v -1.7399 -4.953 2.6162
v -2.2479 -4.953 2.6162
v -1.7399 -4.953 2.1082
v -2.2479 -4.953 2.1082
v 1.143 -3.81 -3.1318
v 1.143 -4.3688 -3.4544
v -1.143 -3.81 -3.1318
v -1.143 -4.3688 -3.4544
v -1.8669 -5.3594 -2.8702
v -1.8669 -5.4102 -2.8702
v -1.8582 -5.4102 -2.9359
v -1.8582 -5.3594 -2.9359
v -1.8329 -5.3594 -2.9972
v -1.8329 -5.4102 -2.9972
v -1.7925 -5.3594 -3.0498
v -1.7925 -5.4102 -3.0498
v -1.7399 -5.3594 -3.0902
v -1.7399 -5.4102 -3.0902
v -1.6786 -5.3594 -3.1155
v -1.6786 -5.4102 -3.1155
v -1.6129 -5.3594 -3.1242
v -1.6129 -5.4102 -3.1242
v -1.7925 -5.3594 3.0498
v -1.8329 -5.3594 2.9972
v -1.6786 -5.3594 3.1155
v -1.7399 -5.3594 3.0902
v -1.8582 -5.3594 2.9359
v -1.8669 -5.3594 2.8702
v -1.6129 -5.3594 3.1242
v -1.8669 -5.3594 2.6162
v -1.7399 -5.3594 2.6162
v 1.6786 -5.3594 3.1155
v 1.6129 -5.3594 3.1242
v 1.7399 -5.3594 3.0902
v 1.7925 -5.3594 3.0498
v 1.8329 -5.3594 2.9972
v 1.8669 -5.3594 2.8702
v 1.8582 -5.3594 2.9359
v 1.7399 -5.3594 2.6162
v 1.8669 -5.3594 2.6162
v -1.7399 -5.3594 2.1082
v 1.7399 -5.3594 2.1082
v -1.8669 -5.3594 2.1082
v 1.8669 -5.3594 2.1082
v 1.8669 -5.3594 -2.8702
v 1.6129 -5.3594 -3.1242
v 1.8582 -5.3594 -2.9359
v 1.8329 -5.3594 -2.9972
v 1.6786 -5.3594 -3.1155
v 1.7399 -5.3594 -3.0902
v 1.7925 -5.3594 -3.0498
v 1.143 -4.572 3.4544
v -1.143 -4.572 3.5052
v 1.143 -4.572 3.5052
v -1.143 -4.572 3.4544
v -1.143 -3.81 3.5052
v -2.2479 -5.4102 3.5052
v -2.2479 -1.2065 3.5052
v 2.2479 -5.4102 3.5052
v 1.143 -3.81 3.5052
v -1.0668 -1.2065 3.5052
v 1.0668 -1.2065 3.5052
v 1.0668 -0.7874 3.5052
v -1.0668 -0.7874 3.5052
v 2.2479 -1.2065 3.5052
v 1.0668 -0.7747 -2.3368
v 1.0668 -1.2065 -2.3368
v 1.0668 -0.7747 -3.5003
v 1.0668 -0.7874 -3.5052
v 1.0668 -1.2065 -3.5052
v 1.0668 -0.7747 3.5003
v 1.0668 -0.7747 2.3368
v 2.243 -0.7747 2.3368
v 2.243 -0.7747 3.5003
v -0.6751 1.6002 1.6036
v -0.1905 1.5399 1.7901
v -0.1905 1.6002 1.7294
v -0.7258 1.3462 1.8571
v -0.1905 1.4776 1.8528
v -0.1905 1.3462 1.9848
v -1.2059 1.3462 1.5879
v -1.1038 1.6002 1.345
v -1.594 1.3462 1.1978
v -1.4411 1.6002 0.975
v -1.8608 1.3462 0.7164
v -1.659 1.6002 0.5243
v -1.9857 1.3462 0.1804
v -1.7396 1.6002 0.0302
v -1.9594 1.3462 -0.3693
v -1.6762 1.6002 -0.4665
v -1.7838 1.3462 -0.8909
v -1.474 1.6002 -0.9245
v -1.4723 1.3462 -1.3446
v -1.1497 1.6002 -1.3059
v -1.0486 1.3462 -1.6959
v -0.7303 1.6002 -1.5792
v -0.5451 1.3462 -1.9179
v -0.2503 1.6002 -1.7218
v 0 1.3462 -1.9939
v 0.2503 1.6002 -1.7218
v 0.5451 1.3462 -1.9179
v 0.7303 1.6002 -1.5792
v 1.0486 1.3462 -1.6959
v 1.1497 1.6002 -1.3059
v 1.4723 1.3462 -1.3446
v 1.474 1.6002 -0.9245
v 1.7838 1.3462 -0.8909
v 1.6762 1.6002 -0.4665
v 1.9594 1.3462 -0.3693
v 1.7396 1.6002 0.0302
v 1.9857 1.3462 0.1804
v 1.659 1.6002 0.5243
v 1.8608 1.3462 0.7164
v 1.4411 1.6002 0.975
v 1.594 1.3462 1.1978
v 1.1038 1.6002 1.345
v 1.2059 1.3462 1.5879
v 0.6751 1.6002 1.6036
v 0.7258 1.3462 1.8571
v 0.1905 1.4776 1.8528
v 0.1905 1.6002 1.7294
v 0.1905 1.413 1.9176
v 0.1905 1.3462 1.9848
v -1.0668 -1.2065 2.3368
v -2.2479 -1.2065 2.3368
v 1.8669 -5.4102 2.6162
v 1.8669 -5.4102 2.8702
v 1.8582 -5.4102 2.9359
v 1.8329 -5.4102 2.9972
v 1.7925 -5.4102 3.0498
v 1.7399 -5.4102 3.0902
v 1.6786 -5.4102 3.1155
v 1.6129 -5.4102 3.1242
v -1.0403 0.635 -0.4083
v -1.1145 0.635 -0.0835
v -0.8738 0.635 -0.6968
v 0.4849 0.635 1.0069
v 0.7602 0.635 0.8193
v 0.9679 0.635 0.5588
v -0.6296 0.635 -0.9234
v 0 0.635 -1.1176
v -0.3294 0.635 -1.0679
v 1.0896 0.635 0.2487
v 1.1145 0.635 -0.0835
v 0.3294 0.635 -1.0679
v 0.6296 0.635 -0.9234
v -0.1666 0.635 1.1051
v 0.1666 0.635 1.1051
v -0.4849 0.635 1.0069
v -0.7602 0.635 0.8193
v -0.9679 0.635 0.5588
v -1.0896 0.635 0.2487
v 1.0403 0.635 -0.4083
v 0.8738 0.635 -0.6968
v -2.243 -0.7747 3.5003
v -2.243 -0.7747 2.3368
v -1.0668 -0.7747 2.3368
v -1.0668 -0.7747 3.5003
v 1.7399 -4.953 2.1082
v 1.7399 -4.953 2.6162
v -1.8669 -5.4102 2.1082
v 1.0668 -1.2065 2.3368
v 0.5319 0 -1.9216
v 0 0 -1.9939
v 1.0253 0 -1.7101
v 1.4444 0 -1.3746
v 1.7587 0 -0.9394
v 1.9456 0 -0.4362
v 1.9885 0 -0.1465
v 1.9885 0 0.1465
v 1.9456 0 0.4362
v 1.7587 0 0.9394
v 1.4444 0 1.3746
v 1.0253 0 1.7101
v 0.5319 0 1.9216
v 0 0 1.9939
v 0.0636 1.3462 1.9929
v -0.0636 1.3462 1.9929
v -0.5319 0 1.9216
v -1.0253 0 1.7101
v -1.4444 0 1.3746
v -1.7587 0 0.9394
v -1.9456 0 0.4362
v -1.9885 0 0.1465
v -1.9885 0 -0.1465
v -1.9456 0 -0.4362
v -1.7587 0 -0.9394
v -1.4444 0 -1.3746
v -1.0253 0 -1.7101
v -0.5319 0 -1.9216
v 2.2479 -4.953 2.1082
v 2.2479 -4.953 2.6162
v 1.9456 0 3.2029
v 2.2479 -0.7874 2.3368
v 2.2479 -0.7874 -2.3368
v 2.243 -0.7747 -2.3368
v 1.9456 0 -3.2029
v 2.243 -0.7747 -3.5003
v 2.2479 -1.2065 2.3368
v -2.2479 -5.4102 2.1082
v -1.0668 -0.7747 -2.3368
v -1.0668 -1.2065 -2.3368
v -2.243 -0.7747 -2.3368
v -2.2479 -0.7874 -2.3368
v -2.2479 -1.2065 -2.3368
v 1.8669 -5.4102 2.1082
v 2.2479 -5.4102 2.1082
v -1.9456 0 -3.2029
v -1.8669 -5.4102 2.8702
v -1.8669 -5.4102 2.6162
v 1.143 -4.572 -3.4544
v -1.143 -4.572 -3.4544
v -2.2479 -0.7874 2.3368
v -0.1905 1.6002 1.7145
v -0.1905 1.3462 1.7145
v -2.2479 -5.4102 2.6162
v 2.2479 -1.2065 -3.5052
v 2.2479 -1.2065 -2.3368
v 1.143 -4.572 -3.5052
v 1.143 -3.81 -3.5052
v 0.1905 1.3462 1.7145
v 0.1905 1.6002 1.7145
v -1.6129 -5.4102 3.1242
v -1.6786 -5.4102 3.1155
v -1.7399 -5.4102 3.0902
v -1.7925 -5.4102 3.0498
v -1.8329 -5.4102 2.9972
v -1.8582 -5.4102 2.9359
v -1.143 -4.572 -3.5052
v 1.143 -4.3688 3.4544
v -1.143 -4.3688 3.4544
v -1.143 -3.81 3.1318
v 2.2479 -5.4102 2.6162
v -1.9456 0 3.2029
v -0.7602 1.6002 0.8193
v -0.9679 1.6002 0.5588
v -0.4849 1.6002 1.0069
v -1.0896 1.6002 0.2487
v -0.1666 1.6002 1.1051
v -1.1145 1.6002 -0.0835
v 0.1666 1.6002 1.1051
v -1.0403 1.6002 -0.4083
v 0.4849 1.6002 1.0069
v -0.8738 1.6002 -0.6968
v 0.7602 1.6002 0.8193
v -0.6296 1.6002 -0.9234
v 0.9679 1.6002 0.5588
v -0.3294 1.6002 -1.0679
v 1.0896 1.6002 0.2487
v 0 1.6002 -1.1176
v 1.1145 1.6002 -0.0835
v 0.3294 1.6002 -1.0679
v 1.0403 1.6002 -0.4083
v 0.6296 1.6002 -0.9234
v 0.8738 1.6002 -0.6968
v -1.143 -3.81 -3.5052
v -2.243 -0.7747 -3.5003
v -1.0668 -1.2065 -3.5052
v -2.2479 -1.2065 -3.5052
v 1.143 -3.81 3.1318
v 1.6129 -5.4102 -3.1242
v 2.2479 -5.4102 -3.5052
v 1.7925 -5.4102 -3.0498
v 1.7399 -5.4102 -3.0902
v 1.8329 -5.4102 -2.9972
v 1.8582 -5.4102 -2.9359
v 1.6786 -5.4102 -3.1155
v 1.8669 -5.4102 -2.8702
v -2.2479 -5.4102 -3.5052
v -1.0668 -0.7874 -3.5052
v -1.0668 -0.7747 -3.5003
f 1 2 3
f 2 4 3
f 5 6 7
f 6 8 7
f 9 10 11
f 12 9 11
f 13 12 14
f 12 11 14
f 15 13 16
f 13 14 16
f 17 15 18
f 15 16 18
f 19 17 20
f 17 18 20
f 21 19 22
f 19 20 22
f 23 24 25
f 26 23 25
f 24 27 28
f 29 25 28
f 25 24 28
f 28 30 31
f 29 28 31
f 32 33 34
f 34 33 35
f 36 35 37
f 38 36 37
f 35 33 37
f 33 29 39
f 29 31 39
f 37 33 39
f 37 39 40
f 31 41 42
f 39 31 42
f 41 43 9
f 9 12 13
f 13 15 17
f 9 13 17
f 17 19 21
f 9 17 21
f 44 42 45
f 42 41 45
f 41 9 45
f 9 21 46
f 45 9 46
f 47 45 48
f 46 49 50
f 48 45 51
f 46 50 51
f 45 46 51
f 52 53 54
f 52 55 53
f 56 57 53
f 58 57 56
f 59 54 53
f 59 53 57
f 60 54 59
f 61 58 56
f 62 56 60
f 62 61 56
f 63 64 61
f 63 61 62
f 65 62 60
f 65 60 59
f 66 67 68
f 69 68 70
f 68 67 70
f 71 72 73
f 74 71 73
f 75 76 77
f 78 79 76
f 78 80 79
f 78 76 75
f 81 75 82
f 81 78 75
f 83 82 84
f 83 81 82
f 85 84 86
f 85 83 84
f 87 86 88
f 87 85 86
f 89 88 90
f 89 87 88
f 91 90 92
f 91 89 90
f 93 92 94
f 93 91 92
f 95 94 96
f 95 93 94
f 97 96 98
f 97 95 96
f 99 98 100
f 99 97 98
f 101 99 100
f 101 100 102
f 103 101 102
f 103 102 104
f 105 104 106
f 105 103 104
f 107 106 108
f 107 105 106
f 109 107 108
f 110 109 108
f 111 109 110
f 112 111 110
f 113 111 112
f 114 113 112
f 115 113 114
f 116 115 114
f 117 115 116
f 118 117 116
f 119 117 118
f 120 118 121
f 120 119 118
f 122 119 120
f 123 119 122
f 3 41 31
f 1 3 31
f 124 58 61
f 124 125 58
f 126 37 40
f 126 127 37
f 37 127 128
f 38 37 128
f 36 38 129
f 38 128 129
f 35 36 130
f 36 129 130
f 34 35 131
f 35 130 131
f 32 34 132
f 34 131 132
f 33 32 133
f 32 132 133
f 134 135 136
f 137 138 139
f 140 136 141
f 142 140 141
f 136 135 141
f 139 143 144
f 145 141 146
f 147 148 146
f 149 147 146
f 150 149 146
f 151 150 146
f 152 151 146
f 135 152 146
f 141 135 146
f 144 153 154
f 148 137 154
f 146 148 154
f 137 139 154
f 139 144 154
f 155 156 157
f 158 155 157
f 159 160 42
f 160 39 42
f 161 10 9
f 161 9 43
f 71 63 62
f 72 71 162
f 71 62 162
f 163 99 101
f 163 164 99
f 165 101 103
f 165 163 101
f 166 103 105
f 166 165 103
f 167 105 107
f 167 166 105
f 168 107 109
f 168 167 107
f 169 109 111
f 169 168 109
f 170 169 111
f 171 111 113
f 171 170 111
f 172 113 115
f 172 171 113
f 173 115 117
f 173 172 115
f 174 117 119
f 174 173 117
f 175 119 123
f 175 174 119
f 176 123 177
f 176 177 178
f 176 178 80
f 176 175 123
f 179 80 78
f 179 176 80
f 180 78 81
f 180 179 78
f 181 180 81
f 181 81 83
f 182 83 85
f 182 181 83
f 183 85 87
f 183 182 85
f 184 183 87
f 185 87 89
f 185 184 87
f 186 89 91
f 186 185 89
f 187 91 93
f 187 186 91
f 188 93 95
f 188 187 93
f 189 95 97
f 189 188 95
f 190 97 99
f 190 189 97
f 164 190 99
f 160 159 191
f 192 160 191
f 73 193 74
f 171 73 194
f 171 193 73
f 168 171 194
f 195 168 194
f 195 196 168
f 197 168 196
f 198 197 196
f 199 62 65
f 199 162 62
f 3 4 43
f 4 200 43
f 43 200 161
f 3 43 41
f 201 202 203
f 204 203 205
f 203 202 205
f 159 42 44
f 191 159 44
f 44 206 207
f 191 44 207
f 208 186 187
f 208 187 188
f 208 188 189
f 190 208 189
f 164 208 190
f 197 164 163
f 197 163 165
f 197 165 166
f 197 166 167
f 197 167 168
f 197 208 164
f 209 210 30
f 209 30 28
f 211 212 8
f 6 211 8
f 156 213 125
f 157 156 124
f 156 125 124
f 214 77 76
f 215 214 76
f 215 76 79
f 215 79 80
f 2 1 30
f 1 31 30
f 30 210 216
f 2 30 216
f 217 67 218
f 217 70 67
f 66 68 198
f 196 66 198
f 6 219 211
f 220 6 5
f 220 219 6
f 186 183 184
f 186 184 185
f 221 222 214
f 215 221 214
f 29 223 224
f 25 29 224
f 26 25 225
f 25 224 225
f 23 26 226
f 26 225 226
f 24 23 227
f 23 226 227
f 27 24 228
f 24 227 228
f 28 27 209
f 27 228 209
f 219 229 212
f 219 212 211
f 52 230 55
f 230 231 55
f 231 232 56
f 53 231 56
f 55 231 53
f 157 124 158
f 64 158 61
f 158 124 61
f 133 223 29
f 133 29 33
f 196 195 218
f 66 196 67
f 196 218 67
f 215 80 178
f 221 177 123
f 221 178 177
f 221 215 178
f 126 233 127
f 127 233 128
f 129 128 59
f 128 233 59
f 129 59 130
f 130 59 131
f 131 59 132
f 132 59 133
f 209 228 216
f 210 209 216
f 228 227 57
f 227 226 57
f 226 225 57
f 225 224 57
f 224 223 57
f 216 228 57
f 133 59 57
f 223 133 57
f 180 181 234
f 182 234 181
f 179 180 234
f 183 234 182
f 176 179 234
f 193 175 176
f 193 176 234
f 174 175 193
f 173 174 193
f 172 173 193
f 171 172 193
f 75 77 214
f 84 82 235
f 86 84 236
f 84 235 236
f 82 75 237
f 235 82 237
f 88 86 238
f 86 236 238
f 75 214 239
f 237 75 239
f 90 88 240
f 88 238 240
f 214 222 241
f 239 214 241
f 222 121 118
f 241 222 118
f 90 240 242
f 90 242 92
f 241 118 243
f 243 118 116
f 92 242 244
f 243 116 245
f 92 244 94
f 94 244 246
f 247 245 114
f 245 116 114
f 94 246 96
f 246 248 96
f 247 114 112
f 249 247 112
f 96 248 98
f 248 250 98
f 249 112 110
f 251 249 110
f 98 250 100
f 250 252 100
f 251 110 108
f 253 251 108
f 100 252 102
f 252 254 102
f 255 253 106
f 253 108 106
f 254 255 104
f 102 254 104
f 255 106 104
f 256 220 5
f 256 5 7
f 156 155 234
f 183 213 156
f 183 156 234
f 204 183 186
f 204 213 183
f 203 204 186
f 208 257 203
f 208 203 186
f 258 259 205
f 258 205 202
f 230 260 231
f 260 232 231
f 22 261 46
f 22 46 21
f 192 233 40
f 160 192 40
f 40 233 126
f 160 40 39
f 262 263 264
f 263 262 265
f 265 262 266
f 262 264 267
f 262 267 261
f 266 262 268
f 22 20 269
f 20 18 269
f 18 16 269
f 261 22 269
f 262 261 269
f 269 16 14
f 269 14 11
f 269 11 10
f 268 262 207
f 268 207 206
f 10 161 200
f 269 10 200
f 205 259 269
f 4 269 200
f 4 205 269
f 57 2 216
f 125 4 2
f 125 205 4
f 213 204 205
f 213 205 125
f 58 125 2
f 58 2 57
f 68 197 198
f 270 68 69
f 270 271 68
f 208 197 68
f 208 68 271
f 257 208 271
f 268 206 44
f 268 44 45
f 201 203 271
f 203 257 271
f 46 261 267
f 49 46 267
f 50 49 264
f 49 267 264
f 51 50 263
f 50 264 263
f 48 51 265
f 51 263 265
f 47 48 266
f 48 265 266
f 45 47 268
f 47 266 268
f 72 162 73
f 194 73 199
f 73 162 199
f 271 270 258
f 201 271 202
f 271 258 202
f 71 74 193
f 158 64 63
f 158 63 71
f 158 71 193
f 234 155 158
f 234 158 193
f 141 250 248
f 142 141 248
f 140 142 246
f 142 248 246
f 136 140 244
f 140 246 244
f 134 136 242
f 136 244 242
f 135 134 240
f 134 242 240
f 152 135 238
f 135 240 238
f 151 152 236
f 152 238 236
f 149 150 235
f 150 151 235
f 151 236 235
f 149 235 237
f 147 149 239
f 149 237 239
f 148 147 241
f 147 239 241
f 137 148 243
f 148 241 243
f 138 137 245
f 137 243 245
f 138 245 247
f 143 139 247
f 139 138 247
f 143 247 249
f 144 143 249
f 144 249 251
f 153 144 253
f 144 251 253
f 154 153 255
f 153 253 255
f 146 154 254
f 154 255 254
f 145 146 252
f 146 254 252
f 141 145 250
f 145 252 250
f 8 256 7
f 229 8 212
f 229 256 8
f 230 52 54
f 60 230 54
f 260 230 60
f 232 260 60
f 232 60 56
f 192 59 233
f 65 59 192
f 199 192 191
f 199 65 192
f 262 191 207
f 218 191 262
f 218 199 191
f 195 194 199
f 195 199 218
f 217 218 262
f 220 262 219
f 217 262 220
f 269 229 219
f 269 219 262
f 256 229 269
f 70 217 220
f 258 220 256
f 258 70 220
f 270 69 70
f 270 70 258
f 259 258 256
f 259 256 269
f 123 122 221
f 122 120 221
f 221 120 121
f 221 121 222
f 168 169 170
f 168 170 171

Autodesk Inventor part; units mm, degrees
sketch "Sketch_1" plane through (0, 0, 0) normal (0, 1, 0) x (-1, 0, 0)
  line L0 (2.2479, 3.5052) -> (-2.2479, 3.5052)
  line L1 (-2.2479, 3.5052) -> (-2.2479, -3.5052)
  line L2 (-2.2479, -3.5052) -> (2.2479, -3.5052)
  line L3 (2.2479, -3.5052) -> (2.2479, 3.5052)
extrude "Extrusion1" add sketch "Sketch_1" against normal blind 5.4102
sketch "Sketch_2" plane through (0, 0, 0) normal (0, 0, 1) x (1, 0, 0)
  line L0 (-2.2479, -0.7874) -> (-1.9456, 0)
  line L1 (-1.9456, 0) -> (1.9456, 0)
  line L2 (1.9456, 0) -> (2.2479, -0.7874)
  line L3 (2.2479, -0.7874) -> (2.2479, 0.127)
  line L4 (2.2479, 0.127) -> (-2.2479, 0.127)
  line L5 (-2.2479, 0.127) -> (-2.2479, -0.7874)
extrude "Extrusion2" cut sketch "Sketch_2" along normal mid plane 7.0104
sketch "Sketch_3" plane through (0, 0, 0) normal (1, 0, 0) x (0, 1, 0)
  line L0 (-0.7874, 3.5052) -> (0, 3.2029)
  line L1 (0, 3.2029) -> (0, -3.2029)
  line L2 (0, -3.2029) -> (-0.7874, -3.5052)
  line L3 (-0.7874, -3.5052) -> (0.127, -3.5052)
  line L4 (0.127, -3.5052) -> (0.127, 3.5052)
  line L5 (0.127, 3.5052) -> (-0.7874, 3.5052)
extrude "Extrusion3" cut sketch "Sketch_3" along normal mid plane 4.4958
sketch "Sketch_4" plane through (0, -0.9906, 0) normal (0, 1, 0) x (1, 0, 0)
  line L0 (-2.5256, 3.7556) -> (-2.5256, -3.7297)
  line L1 (-2.5256, -3.7297) -> (2.532, -3.7297)
  line L2 (2.532, -3.7297) -> (2.532, 3.7556)
  line L3 (2.532, 3.7556) -> (-2.5256, 3.7556)
  line L4 (-2.2479, 2.3368) -> (-2.2479, -2.3368)
  line L5 (-2.2479, -2.3368) -> (-1.0668, -2.3368)
  line L6 (-1.0668, -2.3368) -> (-1.0668, -3.5052)
  line L7 (-1.0668, -3.5052) -> (1.0668, -3.5052)
  line L8 (1.0668, -3.5052) -> (1.0668, -2.3368)
  line L9 (1.0668, -2.3368) -> (2.2479, -2.3368)
  line L10 (2.2479, -2.3368) -> (2.2479, 2.3368)
  line L11 (2.2479, 2.3368) -> (1.0668, 2.3368)
  line L12 (1.0668, 2.3368) -> (1.0668, 3.5052)
  line L13 (1.0668, 3.5052) -> (-1.0668, 3.5052)
  line L14 (-1.0668, 3.5052) -> (-1.0668, 2.3368)
  line L15 (-1.0668, 2.3368) -> (-2.2479, 2.3368)
extrude "Extrusion4" cut sketch "Sketch_4" along normal mid plane 0.4318
sketch "Sketch_5" plane through (0, 0, 0) normal (1, 0, 0) x (0, 1, 0)
  line L0 (0, 0) -> (1.6002, 0)
  line L1 (0.635, 0) -> (0.635, -1.1176)
  line L2 (0.635, -1.1176) -> (1.6002, -1.1176)
  line L3 (1.6002, -1.1176) -> (1.6002, -1.7399)
  line L4 (1.6002, -1.7399) -> (1.3462, -1.9939)
  line L5 (1.3462, -1.9939) -> (0, -1.9939)
  line L6 (0, -1.9939) -> (0, 0)
  line L7 (0, 0) -> (0.635, 0)
revolve "Revolution1" add sketch "Sketch_5" angle 360 about axis through (0, 0, 0) along (0, -1, 0)
sketch "Sketch_6" plane through (0, -5.4102, 0) normal (0, 1, 0) x (1, 0, 0)
  line L0 (-2.6354, 3.6285) -> (-2.6354, -3.6285)
  line L1 (-2.6354, -3.6285) -> (2.6743, -3.6285)
  line L2 (2.6743, -3.6285) -> (2.6743, 3.6285)
  line L3 (2.6743, 3.6285) -> (-2.6354, 3.6285)
  line L4 (-2.2479, -3.5052) -> (2.2479, -3.5052)
  line L5 (2.2479, -3.5052) -> (2.2479, -2.6162)
  line L6 (2.2479, -2.6162) -> (1.7399, -2.6162)
  line L7 (1.7399, -2.6162) -> (1.7399, -2.1082)
  line L8 (1.7399, -2.1082) -> (2.2479, -2.1082)
  line L9 (2.2479, -2.1082) -> (2.2479, 3.5052)
  line L10 (2.2479, 3.5052) -> (-2.2479, 3.5052)
  line L11 (-2.2479, 3.5052) -> (-2.2479, -2.1082)
  line L12 (-2.2479, -2.1082) -> (-1.7399, -2.1082)
  line L13 (-1.7399, -2.1082) -> (-1.7399, -2.6162)
  line L14 (-1.7399, -2.6162) -> (-2.2479, -2.6162)
  line L15 (-2.2479, -2.6162) -> (-2.2479, -3.5052)
extrude "Extrusion5" cut sketch "Sketch_6" along normal blind 0.4572
sketch "Sketch_7" plane through (0, -5.4102, 0) normal (0, 1, 0) x (1, 0, 0)
  line L0 (-1.8669, 2.8702) -> (-1.8669, -2.8702)
  arc A0 (-1.8669, -2.8702) -> (-1.6129, -3.1242) centre (-1.6129, -2.8702) ccw
  line L1 (-1.6129, -3.1242) -> (1.6129, -3.1242)
  arc A1 (1.6129, -3.1242) -> (1.8669, -2.8702) centre (1.6129, -2.8702) ccw
  line L2 (1.8669, -2.8702) -> (1.8669, 2.8702)
  arc A2 (1.8669, 2.8702) -> (1.6129, 3.1242) centre (1.6129, 2.8702) ccw
  line L3 (1.6129, 3.1242) -> (-1.6129, 3.1242)
  arc A3 (-1.6129, 3.1242) -> (-1.8669, 2.8702) centre (-1.6129, 2.8702) ccw
extrude "Extrusion6" cut sketch "Sketch_7" along normal blind 0.0508
sketch "Sketch_11" plane through (0, 1.6002, 0) normal (0, 1, 0) x (1, 0, 0)
  line L0 (-0.1905, -1.7145) -> (-0.1905, -2.0955)
  line L1 (-0.1905, -2.0955) -> (0.1905, -2.0955)
  line L2 (0.1905, -2.0955) -> (0.1905, -1.7145)
  line L3 (0.1905, -1.7145) -> (-0.1905, -1.7145)
extrude "Extrusion7" cut sketch "Sketch_11" against normal blind 0.254
sketch "Sketch_13" plane through (0, 0, 0) normal (0, 0, 1) x (1, 0, 0)
  line L0 (-1.143, -3.81) -> (-1.143, -4.572)
  line L1 (-1.143, -4.572) -> (1.143, -4.572)
  line L2 (1.143, -4.572) -> (1.143, -3.81)
  line L3 (1.143, -3.81) -> (-1.143, -3.81)
extrude "Extrusion8" cut sketch "Sketch_13" along normal mid plane 15.24
sketch "Sketch_14" plane through (0, 0, 0) normal (1, 0, 0) x (0, 1, 0)
  line L0 (-4.3688, 3.4544) -> (-4.572, 3.4544)
  line L1 (-4.572, 3.4544) -> (-4.572, -3.4544)
  line L2 (-4.572, -3.4544) -> (-4.3688, -3.4544)
  line L3 (-4.3688, -3.4544) -> (-3.81, -3.1318)
  line L4 (-3.81, -3.1318) -> (-3.81, 3.1318)
  line L5 (-3.81, 3.1318) -> (-4.3688, 3.4544)
extrude "Extrusion9" add sketch "Sketch_14" along normal mid plane 2.286
ref_plane "to_actuator_XY" through (0, 0, 0) normal (0, -1, 0) x (1, 0, 0)
ref_plane "to_actuator_YZ" through (0, 0, 0) normal (1, 0, 0) x (0, 0, 1)
ref_plane "to_actuator_ZX" through (0, 0, 0) normal (0, 0, 1) x (0, -1, 0)
ref_plane "to_dummy_XY" through (0, 0, 0) normal (0, -1, 0) x (1, 0, 0)
ref_plane "to_dummy_YZ" through (0, 0, 0) normal (1, 0, 0) x (0, 0, 1)
ref_plane "to_dummy_ZX" through (0, 0, 0) normal (0, 0, 1) x (0, -1, 0)
ref_plane "to_trmnl_hold_XY" through (0, -0.9906, 0) normal (0, 1, 0) x (1, 0, 0)
ref_plane "to_trmnl_hold_YZ" through (0, -0.9906, 0) normal (1, 0, 0) x (0, 0, -1)
ref_plane "to_trmnl_hold_ZX" through (0, -0.9906, 0) normal (0, 0, -1) x (0, 1, 0)
ref_plane "to_trmnls_XY" through (0, -4.9022, 0) normal (0, 1, 0) x (1, 0, 0)
ref_plane "to_trmnls_YZ" through (0, -4.9022, 0) normal (1, 0, 0) x (0, 0, -1)
ref_plane "to_trmnls_ZX" through (0, -4.9022, 0) normal (0, 0, -1) x (0, 1, 0)
properties part number "GP-body"
